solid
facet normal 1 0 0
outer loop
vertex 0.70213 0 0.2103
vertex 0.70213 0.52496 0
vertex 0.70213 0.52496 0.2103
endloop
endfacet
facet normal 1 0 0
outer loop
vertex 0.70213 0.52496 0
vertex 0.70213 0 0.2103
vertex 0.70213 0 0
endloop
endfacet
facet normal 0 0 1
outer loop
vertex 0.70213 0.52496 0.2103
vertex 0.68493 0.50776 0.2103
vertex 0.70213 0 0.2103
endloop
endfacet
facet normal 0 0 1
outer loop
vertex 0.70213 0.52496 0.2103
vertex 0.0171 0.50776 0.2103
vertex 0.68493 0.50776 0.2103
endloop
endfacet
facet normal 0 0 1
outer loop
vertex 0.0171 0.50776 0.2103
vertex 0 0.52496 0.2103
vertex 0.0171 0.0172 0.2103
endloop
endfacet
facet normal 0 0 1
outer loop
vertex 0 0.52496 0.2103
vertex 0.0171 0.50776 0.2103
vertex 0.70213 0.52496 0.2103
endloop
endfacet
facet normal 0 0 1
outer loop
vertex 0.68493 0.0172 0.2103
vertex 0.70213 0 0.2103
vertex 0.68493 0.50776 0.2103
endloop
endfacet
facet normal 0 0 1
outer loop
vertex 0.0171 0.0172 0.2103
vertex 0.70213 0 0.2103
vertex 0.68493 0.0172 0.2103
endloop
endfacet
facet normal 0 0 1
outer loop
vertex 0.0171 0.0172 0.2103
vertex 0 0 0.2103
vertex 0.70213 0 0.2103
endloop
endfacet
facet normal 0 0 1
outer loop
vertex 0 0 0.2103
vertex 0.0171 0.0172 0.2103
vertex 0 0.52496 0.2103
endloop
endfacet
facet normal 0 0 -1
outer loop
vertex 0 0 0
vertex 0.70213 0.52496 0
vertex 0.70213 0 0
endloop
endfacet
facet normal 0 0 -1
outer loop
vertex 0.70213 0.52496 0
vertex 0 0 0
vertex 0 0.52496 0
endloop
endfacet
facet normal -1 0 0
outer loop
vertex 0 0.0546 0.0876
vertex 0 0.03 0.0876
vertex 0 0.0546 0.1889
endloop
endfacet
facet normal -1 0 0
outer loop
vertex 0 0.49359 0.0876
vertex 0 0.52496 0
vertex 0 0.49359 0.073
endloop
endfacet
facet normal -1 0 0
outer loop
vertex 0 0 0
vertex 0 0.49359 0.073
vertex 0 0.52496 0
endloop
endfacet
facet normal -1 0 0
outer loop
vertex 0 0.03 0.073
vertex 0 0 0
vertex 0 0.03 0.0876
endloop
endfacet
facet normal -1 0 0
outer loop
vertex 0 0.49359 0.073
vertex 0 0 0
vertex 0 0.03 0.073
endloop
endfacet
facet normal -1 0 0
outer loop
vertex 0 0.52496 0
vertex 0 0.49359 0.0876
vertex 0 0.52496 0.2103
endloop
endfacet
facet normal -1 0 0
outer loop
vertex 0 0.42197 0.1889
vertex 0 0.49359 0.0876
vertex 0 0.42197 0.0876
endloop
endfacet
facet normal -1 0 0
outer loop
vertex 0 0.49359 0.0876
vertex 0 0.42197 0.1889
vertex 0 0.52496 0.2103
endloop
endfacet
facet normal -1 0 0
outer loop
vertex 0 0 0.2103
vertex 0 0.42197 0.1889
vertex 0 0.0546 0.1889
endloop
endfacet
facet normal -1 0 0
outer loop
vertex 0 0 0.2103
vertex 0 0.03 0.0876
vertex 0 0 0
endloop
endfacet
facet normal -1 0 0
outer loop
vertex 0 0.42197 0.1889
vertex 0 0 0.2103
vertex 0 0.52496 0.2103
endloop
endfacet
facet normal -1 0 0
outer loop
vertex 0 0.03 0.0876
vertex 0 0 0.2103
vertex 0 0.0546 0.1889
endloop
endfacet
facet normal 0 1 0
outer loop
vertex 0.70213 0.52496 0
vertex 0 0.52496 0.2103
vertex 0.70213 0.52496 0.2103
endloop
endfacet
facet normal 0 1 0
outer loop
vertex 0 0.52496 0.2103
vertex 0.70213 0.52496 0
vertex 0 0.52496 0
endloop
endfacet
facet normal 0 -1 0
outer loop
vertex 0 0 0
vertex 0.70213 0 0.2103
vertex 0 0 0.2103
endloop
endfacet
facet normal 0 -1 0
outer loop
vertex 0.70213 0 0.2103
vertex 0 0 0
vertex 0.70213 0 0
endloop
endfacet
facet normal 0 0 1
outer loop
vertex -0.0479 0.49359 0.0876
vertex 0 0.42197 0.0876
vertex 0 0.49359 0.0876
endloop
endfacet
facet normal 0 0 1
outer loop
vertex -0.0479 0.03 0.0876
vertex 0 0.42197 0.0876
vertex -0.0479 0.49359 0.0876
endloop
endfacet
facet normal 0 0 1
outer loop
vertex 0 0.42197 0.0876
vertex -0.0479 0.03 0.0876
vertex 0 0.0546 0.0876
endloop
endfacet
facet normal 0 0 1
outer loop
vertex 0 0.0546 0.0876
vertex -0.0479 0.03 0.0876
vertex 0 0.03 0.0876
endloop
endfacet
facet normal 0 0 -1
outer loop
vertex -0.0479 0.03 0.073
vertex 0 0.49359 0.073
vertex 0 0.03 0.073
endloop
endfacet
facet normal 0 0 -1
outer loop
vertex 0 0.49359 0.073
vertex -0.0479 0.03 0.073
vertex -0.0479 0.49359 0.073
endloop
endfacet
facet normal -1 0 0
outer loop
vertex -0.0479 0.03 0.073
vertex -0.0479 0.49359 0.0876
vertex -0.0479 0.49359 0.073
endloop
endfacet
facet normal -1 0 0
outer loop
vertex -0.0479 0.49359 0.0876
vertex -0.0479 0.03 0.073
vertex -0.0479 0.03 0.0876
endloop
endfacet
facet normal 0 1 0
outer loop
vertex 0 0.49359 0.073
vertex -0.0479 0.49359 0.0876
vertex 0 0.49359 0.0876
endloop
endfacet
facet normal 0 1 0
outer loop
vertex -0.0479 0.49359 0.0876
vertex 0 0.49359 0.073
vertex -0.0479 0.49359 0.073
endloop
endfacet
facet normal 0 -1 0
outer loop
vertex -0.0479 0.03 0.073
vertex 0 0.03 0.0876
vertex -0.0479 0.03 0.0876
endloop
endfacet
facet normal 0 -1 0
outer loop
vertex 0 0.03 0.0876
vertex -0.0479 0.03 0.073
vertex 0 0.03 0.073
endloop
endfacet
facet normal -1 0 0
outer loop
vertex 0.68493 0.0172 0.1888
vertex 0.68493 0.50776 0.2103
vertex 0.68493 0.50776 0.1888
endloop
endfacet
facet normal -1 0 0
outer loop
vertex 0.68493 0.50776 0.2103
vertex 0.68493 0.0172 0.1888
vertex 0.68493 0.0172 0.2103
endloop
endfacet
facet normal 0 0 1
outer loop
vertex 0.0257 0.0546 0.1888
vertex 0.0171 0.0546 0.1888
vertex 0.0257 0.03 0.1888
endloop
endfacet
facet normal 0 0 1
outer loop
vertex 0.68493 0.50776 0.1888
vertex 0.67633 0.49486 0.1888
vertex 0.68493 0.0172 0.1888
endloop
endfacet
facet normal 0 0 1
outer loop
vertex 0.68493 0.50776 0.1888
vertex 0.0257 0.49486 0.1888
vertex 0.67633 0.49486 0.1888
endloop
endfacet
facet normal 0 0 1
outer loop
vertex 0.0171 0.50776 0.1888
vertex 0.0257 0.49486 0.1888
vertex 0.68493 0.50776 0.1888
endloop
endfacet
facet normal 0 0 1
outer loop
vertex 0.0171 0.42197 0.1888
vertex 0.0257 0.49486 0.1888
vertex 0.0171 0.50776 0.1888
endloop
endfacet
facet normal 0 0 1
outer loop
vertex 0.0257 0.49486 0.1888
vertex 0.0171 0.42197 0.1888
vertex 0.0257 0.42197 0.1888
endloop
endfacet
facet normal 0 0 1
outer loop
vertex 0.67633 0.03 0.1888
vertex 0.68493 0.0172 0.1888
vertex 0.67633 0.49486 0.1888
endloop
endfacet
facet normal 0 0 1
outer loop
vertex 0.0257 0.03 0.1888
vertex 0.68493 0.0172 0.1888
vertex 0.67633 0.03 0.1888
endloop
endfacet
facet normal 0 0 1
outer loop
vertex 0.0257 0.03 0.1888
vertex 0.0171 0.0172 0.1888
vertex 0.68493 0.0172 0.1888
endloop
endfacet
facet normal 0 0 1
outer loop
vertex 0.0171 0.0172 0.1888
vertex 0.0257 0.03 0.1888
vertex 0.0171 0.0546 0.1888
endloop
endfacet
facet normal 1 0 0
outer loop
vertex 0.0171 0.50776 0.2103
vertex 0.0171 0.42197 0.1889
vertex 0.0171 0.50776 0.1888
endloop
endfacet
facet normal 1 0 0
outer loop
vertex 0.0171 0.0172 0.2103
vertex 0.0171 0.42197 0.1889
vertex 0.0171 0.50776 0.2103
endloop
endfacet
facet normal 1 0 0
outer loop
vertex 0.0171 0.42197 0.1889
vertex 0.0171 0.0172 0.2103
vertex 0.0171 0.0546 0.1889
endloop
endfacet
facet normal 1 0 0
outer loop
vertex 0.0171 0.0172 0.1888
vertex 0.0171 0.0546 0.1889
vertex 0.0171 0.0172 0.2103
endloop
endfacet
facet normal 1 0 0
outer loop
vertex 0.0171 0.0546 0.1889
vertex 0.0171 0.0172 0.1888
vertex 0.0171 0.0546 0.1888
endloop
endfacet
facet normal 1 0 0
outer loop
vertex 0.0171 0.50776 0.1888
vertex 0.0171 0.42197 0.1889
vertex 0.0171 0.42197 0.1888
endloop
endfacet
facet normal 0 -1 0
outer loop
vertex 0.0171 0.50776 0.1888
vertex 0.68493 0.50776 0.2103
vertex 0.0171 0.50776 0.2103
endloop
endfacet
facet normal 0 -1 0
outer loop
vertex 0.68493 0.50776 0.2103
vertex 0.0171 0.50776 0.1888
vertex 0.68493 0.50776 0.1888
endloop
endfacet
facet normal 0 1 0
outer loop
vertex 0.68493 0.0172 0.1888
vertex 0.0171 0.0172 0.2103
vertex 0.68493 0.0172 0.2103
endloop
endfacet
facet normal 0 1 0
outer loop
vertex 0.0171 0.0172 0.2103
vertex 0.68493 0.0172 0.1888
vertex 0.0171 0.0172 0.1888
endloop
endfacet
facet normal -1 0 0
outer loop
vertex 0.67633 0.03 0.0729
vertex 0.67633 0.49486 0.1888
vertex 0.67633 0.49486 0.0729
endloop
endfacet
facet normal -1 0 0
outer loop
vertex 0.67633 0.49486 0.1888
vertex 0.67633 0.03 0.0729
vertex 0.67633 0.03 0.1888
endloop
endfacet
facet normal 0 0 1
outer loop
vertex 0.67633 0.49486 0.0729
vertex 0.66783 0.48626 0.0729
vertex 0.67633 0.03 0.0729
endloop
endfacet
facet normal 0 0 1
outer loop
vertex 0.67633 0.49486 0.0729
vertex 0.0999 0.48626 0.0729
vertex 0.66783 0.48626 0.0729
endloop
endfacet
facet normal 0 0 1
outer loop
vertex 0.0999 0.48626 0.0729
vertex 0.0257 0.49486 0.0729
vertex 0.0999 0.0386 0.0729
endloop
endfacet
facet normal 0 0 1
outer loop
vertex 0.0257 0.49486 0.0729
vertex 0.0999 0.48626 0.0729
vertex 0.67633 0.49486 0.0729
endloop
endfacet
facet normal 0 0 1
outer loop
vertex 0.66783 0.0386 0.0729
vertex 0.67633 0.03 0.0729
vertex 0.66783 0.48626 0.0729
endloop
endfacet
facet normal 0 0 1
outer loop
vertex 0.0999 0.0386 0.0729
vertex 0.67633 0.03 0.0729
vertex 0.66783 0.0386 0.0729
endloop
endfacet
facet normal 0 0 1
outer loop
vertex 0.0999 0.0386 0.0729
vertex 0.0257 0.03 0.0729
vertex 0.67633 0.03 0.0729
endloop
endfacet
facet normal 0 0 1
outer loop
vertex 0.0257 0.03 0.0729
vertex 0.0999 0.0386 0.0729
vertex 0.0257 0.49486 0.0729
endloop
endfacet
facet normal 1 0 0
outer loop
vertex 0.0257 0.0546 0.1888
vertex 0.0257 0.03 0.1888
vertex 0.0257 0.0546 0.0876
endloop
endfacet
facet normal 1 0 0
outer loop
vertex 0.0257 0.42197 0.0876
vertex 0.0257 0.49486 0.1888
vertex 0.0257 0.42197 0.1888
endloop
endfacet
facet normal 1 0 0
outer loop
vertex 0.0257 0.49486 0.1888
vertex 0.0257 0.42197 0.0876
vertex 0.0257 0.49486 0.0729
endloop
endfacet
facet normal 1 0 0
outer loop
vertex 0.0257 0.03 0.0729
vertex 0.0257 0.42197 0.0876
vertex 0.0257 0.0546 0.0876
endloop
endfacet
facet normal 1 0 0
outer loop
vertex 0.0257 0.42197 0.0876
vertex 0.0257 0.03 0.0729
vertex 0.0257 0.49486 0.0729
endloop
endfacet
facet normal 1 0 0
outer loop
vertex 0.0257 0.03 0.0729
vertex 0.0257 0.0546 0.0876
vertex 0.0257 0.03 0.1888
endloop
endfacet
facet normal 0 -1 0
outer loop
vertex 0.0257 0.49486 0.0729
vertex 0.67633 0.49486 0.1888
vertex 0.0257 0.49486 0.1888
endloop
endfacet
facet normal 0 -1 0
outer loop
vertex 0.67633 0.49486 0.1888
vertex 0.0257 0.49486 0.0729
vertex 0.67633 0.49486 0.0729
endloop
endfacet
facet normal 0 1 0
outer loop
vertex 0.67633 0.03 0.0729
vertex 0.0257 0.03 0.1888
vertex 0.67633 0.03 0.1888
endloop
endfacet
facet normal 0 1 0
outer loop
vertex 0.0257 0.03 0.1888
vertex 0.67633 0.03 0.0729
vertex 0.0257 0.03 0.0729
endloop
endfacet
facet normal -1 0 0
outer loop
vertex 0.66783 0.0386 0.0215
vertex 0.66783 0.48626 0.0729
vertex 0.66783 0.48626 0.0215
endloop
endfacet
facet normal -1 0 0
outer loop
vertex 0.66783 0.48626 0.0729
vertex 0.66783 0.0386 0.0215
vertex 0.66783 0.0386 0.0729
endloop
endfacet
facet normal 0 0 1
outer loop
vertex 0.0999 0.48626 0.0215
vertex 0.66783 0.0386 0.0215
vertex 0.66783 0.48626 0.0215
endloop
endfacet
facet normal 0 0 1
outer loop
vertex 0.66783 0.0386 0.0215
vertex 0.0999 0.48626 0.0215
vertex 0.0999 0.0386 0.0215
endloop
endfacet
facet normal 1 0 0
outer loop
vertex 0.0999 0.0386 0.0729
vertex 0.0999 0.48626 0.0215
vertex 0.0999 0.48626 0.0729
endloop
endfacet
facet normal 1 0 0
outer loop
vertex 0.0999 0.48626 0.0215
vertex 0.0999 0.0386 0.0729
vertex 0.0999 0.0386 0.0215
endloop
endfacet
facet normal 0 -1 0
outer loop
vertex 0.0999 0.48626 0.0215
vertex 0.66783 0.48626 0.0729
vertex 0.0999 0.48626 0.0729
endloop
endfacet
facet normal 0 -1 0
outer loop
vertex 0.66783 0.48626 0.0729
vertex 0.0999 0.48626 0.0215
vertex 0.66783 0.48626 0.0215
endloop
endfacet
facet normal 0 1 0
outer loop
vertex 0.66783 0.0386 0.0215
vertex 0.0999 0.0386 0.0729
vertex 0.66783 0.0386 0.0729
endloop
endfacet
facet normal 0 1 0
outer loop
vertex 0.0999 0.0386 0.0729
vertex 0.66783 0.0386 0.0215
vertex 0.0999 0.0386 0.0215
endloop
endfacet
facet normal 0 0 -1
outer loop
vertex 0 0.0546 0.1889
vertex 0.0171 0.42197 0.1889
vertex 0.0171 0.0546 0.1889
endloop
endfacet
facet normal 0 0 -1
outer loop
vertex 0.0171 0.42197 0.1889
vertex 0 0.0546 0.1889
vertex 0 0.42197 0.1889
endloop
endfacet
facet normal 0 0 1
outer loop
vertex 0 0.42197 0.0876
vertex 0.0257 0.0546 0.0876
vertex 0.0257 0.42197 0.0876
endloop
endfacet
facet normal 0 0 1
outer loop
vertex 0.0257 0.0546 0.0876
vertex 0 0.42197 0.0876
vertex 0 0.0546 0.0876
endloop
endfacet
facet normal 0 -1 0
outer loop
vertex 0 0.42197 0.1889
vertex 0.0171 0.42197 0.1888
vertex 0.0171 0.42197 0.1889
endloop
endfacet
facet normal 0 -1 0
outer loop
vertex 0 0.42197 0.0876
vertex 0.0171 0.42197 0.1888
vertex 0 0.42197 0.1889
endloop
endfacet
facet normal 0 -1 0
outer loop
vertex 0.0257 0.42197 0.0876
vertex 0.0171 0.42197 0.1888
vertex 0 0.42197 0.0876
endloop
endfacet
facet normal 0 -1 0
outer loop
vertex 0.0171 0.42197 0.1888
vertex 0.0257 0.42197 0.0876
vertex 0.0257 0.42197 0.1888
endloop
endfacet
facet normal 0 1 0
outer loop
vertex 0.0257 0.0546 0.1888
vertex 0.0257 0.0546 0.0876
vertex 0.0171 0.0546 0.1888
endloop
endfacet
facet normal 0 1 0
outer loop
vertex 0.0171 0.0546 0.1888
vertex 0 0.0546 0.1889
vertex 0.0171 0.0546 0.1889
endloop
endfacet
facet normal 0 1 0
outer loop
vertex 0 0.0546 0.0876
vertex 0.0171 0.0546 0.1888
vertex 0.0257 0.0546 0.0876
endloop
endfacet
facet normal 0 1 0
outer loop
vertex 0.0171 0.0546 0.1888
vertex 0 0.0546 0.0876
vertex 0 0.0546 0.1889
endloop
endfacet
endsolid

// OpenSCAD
// ---------------------------------------------------------------
// Parametric rectangular solid with stepped pockets and side feature
// All dimensions in millimeters
// ---------------------------------------------------------------

// Main body dimensions
body_length   = 0.702127;   // X
body_width    = 0.524964;   // Y
body_height   = 0.210295;   // nominal
main_height   = 0.210300;   // formed main height (Z)

// Top shallow recess (uppermost step)
top_cut_len   = 0.667793;   // X size
top_cut_wid   = 0.490631;   // Y size
top_inset_l   = 0.0171;
top_inset_r   = 0.0172;
top_inset_f   = 0.0172;     // front
top_inset_b   = 0.0172;     // back
top_z_bottom  = 0.1888;
top_z_top     = 0.2103;
top_depth     = 0.0215;

// Middle continuation cut
mid_cut_len   = 0.650626;
mid_cut_wid   = 0.46488;
mid_inset_l   = 0.0257;
mid_inset_r   = 0.0258;
mid_inset_f   = 0.03;
mid_inset_b   = 0.0301;
mid_z_bottom  = 0.0729;
mid_z_top     = 0.1888;
mid_depth     = 0.1159;

// Lower offset pocket (non-through)
low_cut_len   = 0.567882;
low_cut_wid   = 0.447713;
low_inset_l   = 0.0999;
low_inset_r   = 0.0343;
low_inset_f   = 0.0386;
low_inset_b   = 0.0387;
low_z_bottom  = 0.0215;     // leaves bottom thickness 0.0215
low_z_top     = 0.073;
low_depth     = 0.0515;

// Solid side projection on left edge
proj_len      = 0.130618;   // X size
proj_wid      = 0.463588;   // Y size
proj_overhang = 0.0479;     // overhang beyond left edge
proj_to_right = 0.6194;     // from body right edge to projection right face
proj_inset_f  = 0.03;
proj_inset_b  = 0.0314;
proj_thickness = 0.0146;
proj_z_bottom = 0.073;
proj_z_top    = 0.0876;

// Side recess cut into left edge
srec_span_x   = 0.0343;     // depth into body from left edge
srec_face_l   = 0.367372;   // Y length of recessed face
srec_face_w   = 0.101285;   // informational face width
srec_to_right = 0.6678;     // remaining material to right edge
srec_inset_f  = 0.0546;
srec_inset_b  = 0.103;
srec_z_bottom = 0.0876;
srec_z_top    = 0.1889;
srec_depth    = 0.0343;

$fn = 64;

// ---------------------------------------------------------------
// Module: axis-aligned box defined by corner coordinates
// ---------------------------------------------------------------
module box(x1, y1, z1, x2, y2, z2) {
    translate([x1, y1, z1])
        cube([x2 - x1, y2 - y1, z2 - z1]);
}

// ---------------------------------------------------------------
// Module: full positive geometry (main body + side projection)
// ---------------------------------------------------------------
module base_solid() {
    union() {
        // Main reference rectangular solid
        box(0, 0, 0, body_length, body_width, main_height);

        // Solid side projection overhanging the left length edge,
        // lower band from z = 0.073 to 0.0876
        box(-proj_overhang,
            proj_inset_f,
            proj_z_bottom,
            body_length - proj_to_right,
            proj_inset_f + proj_wid,
            proj_z_top);
    }
}

// ---------------------------------------------------------------
// Module: subtractive features (three stacked pockets + side recess)
// ---------------------------------------------------------------
module cavity_set() {
    union() {
        // Top shallow recess, open to the top surface
        box(top_inset_l,
            top_inset_f,
            top_z_bottom,
            body_length - top_inset_r,
            body_width - top_inset_b,
            top_z_top);

        // Middle continuation cut
        box(mid_inset_l,
            mid_inset_f,
            mid_z_bottom,
            body_length - mid_inset_r,
            body_width - mid_inset_b,
            mid_z_top);

        // Lower, more offset pocket (non-through, bottom thickness kept)
        box(low_inset_l,
            low_inset_f,
            low_z_bottom,
            body_length - low_inset_r,
            body_width - low_inset_b,
            low_z_top);

        // Side recess at left edge, contained vertical band
        box(0,
            srec_inset_f,
            srec_z_bottom,
            srec_span_x,
            srec_inset_f + srec_face_l,
            srec_z_top);
    }
}

// ---------------------------------------------------------------
// Final model: solid minus cavities
// ---------------------------------------------------------------
difference() {
    base_solid();
    cavity_set();
}
